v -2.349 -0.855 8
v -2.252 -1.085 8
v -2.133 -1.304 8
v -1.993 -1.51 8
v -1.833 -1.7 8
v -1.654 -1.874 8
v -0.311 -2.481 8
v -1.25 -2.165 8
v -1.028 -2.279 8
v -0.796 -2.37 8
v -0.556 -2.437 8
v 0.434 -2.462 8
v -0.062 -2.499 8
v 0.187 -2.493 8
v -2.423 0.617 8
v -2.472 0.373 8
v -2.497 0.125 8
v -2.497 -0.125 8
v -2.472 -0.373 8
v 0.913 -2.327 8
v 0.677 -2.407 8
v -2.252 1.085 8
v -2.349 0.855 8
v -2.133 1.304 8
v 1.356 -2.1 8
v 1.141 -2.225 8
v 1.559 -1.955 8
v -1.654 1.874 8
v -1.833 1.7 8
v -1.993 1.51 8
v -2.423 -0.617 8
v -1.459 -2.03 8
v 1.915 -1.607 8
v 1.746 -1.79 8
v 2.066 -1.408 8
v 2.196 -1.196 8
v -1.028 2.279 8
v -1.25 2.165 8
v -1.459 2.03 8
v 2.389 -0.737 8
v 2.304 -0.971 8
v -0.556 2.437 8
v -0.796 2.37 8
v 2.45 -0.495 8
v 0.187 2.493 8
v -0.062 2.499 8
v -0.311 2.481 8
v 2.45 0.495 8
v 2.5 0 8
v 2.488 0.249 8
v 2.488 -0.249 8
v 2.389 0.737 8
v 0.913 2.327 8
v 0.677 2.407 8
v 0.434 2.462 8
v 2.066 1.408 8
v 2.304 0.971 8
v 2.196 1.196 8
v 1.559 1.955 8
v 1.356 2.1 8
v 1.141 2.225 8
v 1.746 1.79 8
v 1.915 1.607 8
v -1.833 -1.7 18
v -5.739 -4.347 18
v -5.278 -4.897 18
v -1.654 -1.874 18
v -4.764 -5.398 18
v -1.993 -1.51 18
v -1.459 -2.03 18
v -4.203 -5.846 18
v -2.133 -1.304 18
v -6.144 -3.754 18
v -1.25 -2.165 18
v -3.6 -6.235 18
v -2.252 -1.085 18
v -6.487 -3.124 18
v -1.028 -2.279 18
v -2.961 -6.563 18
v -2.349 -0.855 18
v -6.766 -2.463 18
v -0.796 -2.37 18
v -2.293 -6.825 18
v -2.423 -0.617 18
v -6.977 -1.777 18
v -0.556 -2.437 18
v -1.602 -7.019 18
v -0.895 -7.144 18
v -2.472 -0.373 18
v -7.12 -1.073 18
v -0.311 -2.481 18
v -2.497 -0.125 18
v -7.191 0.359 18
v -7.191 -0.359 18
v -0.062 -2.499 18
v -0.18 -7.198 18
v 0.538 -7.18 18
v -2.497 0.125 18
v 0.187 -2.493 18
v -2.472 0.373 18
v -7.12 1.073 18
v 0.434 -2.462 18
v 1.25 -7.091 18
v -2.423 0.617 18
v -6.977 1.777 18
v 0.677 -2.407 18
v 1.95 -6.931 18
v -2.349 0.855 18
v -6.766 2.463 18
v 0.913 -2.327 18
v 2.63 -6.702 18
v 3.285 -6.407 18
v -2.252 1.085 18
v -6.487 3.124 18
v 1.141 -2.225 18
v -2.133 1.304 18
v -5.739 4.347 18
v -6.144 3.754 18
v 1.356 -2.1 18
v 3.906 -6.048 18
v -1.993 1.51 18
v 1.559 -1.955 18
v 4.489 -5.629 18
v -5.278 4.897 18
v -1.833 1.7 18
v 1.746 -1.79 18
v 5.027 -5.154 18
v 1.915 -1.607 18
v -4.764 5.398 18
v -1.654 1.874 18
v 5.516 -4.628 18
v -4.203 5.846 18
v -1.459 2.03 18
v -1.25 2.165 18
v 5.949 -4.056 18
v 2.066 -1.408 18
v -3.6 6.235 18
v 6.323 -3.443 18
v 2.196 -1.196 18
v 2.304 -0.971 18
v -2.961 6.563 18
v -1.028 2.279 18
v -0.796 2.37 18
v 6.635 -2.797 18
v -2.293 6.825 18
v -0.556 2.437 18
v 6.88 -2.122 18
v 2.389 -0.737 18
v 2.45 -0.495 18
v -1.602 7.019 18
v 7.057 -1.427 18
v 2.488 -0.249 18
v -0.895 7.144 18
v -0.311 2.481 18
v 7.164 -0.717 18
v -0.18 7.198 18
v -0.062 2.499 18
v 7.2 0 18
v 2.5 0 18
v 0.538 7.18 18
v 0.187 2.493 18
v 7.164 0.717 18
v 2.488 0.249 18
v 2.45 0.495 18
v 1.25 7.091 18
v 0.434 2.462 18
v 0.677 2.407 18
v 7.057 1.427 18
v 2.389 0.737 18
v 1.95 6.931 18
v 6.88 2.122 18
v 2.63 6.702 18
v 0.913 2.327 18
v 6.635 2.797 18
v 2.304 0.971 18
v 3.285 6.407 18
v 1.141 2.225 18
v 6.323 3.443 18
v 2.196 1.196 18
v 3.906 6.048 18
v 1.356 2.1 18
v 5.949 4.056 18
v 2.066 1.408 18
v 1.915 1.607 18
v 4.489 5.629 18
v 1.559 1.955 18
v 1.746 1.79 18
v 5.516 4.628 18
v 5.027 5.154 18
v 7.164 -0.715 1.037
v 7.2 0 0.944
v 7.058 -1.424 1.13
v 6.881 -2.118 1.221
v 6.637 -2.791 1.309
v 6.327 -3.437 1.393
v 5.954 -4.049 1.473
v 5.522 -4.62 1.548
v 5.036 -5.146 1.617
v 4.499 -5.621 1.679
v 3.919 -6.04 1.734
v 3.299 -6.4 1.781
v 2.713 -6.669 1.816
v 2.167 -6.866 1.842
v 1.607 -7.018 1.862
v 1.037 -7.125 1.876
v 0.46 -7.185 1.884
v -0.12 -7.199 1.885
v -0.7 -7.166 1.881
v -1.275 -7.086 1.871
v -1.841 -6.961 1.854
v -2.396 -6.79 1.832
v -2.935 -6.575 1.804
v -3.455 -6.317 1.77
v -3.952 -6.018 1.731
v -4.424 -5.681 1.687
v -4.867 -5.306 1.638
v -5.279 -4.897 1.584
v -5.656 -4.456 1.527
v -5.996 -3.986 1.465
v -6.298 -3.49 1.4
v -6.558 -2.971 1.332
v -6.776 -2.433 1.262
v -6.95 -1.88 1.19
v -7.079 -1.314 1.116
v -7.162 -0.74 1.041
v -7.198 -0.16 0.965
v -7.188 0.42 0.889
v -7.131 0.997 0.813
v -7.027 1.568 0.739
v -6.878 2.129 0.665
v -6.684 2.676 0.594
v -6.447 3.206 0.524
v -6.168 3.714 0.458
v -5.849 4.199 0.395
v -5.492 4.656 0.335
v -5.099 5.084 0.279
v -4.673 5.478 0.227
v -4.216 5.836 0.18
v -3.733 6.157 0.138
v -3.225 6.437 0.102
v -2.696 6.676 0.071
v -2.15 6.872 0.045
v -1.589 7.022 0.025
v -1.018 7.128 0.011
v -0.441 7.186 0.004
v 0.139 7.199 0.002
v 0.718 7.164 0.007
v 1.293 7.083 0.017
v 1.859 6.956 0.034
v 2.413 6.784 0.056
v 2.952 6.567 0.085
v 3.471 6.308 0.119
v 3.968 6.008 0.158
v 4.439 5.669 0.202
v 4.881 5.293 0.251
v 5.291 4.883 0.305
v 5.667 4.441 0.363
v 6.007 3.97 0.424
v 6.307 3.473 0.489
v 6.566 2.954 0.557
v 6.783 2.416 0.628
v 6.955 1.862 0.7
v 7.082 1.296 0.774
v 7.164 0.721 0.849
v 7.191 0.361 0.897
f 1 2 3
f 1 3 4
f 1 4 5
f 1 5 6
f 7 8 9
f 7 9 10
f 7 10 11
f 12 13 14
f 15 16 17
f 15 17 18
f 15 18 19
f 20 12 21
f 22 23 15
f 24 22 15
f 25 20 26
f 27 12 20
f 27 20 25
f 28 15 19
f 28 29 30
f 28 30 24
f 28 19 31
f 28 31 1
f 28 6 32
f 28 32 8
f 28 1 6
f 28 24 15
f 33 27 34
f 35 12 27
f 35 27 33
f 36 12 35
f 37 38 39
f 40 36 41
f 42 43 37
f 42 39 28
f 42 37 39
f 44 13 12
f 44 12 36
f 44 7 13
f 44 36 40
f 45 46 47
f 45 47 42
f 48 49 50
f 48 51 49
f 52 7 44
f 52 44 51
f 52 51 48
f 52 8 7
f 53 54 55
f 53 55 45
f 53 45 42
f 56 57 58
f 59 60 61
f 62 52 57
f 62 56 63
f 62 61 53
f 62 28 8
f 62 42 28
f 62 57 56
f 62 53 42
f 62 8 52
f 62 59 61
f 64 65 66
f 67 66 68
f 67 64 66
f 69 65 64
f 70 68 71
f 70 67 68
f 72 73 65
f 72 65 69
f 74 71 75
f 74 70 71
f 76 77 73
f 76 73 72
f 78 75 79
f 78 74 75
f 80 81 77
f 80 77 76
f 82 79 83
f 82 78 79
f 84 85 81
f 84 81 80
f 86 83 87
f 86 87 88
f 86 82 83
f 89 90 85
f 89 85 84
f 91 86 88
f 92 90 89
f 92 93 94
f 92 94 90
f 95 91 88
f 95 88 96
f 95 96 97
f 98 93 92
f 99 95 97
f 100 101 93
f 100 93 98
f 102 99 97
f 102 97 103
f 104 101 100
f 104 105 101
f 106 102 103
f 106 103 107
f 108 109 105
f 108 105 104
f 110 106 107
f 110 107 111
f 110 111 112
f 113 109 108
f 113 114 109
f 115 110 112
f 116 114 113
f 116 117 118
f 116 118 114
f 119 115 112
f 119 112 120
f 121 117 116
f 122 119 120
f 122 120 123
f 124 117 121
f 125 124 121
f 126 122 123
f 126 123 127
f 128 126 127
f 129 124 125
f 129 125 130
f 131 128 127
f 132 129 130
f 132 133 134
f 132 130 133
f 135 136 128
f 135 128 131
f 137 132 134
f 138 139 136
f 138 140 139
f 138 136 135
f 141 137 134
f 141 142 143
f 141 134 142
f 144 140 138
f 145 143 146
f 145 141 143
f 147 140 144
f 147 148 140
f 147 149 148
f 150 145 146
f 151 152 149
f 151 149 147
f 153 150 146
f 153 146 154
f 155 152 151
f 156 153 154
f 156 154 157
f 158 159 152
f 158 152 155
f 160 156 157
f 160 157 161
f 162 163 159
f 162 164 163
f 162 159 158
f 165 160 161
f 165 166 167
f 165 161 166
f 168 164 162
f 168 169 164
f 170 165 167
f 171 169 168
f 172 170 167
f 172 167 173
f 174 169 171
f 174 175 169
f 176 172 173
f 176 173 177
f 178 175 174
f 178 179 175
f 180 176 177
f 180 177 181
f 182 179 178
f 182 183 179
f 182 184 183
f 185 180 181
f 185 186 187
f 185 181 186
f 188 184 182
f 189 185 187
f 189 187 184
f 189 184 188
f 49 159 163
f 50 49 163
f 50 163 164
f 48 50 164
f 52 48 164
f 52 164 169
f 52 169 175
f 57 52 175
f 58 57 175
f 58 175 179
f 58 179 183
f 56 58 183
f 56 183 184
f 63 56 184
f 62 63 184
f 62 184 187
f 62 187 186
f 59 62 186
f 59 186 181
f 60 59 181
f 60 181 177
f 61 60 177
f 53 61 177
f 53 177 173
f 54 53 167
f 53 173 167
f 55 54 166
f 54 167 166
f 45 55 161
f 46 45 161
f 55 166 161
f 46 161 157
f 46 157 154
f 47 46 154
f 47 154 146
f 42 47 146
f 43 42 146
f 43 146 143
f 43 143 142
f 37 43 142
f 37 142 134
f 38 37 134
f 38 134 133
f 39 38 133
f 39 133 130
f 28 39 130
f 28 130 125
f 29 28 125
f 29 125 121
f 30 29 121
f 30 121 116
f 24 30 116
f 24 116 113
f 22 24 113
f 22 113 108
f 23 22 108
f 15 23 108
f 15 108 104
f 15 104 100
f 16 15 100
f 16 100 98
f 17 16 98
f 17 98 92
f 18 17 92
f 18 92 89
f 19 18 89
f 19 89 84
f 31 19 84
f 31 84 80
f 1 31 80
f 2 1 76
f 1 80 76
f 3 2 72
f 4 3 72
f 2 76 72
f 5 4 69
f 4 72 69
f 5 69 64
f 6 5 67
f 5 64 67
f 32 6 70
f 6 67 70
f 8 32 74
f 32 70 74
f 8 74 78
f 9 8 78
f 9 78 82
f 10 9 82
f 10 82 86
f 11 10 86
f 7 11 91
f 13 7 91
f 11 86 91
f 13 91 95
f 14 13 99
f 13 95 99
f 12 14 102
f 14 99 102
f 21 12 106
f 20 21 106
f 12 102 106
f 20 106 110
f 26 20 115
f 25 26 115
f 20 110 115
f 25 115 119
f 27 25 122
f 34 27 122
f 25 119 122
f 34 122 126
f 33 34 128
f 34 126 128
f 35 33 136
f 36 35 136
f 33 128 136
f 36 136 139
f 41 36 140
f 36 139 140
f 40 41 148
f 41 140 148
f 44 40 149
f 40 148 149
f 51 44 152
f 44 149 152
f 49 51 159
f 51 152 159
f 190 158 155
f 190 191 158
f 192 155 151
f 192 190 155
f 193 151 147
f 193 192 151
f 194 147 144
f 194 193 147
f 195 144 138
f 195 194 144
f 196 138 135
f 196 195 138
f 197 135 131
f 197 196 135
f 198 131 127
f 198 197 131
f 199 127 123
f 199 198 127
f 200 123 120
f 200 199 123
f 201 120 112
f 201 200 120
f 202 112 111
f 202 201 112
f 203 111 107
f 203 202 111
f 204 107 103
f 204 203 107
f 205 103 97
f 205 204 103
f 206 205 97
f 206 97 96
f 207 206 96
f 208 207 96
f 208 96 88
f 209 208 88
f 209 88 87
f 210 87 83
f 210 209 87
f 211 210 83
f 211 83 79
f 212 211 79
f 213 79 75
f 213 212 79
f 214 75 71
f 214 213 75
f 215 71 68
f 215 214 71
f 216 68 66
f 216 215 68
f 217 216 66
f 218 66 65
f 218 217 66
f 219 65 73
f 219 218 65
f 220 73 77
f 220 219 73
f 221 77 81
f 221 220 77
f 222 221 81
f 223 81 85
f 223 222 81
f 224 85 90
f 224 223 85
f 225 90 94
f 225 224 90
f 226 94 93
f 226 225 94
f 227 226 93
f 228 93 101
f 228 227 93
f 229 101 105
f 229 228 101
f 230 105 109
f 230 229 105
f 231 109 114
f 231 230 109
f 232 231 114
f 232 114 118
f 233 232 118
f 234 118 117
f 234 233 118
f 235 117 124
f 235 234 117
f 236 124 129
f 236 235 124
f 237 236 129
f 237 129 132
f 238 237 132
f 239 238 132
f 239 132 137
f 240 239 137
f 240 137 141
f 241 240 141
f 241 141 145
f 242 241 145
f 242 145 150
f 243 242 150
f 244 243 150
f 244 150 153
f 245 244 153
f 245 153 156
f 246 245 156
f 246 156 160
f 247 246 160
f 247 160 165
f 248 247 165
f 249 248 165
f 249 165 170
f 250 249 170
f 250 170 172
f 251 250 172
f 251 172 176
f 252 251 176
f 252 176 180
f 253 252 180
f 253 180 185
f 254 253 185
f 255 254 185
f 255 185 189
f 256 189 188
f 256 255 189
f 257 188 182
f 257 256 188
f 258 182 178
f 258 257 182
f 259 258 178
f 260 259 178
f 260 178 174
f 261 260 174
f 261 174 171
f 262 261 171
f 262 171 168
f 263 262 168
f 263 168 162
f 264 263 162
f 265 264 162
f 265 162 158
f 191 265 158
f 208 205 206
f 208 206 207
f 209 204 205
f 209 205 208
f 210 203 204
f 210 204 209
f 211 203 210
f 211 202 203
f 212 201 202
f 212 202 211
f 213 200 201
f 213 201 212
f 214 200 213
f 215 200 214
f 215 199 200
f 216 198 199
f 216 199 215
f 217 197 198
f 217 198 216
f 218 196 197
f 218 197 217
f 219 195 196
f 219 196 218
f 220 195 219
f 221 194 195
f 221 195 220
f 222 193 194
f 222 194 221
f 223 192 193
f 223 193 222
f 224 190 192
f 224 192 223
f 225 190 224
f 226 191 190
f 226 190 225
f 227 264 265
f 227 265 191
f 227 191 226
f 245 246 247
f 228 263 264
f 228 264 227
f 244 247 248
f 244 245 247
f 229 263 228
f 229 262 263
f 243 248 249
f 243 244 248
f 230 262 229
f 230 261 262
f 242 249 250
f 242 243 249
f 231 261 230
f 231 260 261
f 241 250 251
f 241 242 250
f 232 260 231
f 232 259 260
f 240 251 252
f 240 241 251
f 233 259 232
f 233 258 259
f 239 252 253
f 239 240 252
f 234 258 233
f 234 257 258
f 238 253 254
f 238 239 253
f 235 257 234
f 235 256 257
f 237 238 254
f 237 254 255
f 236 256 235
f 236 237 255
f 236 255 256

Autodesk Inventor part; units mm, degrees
ref_plane "YZ Plane" through (0, 0, 0) normal (1, 0, 0) x (0, 1, 0)
ref_plane "XZ Plane" through (0, 0, 0) normal (0, 1, 0) x (-1, 0, 0)
ref_plane "XY Plane" through (0, 0, 0) normal (0, 0, 1) x (1, 0, 0)
sketch "Sketch1" plane through (0, 0, 0) normal (0, 0, 1) x (1, 0, 0)
  circle A0 centre (0, 0) radius 7.2
  dimension "d0" = 14.4
extrude "Extrusion1" add sketch "Sketch1" along normal blind 18
sketch "Sketch2" plane through (0, 0, 18) normal (0, 0, 1) x (1, 0, 0)
  circle A0 centre (0, 0) radius 2.5
  dimension "d3" = 5
extrude "Extrusion2" cut sketch "Sketch2" against normal blind 10
sketch "Sketch3" plane through (0, 0, 0) normal (0, 0, 1) x (1, 0, 0)
  circle A0 centre (0, 0) radius 7.2 projected
  line L0 (11.2434, 7.2) -> (-13.4853, 7.2) construction
ref_plane "Work Plane1" through (11.2434, 7.2, 0) normal (0, -0.1297, -0.9916) x (-1, 0, 0)
sketch "Sketch4" plane through (11.2434, 7.2, 0) normal (0, -0.1297, -0.9916) x (-1, 0, 0)
  line L0 (30.8181, -24.4459) -> (-8.3313, -24.4459)
  line L1 (-8.3313, -24.4459) -> (-8.3313, 10.1675)
  line L2 (-8.3313, 10.1675) -> (30.8181, 10.1675)
  line L3 (30.8181, 10.1675) -> (30.8181, -24.4459)
  line L4 (30.8181, -24.4459) -> (-8.3313, 10.1675) construction
  line L5 (-8.3313, -24.4459) -> (30.8181, 10.1675) construction
  point P0 (11.2434, -7.1392)
extrude "Extrusion3" cut sketch "Sketch4" along normal blind 10
properties part number "HoleFill3"
